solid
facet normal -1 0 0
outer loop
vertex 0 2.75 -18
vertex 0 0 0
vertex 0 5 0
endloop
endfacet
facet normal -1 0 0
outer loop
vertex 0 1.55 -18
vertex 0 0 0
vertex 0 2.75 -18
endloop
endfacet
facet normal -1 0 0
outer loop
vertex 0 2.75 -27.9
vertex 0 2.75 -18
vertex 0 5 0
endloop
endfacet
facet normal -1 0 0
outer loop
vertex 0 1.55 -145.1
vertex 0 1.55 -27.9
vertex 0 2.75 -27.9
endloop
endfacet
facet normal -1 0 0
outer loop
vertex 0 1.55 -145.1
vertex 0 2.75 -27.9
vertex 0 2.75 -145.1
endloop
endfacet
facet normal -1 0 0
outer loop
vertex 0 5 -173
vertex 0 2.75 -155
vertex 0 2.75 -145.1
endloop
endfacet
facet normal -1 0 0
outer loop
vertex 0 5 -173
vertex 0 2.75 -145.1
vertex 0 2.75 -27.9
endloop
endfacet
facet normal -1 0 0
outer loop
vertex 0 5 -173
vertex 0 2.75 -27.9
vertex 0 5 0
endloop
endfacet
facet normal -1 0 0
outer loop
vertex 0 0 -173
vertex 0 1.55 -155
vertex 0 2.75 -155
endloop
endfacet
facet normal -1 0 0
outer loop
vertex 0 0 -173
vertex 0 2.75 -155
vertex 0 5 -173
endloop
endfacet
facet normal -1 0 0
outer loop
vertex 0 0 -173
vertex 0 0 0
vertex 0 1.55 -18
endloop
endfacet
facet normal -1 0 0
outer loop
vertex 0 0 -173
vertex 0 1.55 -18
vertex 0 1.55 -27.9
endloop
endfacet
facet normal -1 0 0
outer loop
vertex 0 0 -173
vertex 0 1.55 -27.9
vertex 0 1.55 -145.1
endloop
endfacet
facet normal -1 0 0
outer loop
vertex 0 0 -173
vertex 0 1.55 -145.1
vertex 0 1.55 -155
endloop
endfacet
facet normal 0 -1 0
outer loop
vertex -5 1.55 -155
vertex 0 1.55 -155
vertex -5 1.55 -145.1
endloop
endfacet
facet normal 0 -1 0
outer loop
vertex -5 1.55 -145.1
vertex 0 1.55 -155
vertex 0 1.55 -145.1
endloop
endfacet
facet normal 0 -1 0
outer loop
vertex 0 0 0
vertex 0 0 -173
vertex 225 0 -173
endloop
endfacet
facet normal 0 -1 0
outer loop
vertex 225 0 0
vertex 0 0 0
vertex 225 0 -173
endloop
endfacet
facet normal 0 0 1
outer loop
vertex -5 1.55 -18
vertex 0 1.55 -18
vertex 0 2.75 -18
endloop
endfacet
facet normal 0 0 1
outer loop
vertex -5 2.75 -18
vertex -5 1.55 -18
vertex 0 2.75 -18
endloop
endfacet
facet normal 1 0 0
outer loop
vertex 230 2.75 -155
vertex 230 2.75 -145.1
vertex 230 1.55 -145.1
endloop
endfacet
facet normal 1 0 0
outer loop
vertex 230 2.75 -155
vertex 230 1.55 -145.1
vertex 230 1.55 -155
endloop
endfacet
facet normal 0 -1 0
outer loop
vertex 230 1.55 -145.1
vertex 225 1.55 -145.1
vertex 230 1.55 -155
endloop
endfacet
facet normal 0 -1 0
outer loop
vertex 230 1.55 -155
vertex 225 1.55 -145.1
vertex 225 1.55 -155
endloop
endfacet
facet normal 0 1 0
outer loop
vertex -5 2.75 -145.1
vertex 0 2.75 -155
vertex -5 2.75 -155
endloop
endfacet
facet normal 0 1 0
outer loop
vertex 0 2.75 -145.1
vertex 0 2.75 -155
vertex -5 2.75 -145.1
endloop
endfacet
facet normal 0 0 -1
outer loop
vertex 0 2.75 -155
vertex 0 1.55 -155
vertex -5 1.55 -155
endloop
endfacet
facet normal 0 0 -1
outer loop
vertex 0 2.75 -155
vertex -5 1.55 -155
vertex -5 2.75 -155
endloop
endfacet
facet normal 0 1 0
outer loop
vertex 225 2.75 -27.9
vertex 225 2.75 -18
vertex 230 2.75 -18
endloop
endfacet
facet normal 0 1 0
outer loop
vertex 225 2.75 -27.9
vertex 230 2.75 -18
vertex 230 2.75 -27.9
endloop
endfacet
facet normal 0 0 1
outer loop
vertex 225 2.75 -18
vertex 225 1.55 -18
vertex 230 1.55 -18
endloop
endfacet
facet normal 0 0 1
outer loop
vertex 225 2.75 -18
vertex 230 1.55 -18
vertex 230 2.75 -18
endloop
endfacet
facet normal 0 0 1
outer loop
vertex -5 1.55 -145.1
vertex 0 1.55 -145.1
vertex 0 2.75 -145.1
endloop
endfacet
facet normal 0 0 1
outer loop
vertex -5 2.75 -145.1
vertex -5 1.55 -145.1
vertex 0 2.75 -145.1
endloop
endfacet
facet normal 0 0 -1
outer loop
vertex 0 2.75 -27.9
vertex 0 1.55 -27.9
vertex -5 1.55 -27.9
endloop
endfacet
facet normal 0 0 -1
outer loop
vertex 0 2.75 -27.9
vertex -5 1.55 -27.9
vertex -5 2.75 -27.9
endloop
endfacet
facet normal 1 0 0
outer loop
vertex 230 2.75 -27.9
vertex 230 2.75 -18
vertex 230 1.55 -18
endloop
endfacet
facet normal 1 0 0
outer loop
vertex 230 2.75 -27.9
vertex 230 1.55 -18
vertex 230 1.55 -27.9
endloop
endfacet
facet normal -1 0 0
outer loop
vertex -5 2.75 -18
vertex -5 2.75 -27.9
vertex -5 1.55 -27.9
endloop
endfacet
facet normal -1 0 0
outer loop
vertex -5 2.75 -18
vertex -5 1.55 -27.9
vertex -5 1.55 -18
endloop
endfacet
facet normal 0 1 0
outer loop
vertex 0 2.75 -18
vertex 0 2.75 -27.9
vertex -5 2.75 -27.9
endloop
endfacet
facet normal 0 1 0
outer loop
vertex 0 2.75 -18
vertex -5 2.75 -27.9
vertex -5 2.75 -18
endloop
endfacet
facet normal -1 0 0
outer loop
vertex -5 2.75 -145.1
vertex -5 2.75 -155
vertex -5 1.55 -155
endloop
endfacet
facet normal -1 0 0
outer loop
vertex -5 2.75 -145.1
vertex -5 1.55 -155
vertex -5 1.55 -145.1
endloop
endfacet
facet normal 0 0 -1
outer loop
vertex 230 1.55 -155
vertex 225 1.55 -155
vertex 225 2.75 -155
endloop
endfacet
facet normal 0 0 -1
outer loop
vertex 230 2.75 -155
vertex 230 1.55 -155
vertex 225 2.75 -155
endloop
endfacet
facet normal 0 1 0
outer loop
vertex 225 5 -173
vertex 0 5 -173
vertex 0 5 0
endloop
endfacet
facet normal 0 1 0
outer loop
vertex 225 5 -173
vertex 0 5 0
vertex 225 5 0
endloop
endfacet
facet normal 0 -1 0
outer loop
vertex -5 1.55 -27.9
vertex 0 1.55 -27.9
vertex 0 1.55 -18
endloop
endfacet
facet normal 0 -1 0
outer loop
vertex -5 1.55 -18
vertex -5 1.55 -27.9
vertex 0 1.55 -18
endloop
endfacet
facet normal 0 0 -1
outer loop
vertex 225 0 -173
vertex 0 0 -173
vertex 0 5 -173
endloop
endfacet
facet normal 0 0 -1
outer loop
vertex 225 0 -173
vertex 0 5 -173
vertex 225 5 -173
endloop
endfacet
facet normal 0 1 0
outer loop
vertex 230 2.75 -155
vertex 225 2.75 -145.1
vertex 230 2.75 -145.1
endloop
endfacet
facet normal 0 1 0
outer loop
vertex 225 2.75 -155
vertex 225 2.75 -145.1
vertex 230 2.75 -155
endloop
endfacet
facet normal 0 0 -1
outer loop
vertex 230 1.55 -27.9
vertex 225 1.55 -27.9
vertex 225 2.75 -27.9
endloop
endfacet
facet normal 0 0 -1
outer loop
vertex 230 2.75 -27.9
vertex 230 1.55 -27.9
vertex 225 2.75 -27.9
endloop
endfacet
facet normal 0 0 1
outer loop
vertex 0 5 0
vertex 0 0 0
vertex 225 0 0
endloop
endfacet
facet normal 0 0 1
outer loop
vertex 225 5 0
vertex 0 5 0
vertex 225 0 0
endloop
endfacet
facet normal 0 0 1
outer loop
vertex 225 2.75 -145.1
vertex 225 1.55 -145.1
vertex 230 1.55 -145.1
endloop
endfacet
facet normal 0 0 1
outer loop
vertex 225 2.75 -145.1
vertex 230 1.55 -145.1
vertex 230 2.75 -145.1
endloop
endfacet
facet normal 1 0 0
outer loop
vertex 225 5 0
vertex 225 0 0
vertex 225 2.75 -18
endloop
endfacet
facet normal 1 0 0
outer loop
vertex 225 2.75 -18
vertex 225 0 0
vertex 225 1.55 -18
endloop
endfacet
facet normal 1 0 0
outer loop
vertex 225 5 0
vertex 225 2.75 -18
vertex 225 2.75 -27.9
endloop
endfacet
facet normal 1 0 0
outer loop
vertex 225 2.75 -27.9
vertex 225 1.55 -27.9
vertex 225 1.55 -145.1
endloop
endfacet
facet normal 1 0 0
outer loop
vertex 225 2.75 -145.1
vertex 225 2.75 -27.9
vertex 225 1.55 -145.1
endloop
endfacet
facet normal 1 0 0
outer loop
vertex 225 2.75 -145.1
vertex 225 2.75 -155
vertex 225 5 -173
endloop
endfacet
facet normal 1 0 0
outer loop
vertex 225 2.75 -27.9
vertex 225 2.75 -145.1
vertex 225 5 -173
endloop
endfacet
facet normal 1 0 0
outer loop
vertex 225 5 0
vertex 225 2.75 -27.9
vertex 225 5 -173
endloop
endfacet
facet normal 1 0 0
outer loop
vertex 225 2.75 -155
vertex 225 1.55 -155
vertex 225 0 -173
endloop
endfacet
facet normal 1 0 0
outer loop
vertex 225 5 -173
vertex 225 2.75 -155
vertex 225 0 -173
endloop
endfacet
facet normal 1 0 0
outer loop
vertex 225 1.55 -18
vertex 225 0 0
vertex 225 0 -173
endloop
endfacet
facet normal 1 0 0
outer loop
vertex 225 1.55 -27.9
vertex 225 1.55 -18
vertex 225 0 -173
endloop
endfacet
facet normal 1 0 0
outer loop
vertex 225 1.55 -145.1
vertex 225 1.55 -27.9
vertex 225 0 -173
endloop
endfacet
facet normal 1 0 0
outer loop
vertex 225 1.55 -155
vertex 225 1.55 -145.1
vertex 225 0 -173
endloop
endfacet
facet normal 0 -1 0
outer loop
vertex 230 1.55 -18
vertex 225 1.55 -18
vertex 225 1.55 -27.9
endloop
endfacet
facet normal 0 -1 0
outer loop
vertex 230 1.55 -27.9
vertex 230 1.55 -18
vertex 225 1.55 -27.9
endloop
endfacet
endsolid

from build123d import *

# Parameters (mm, degrees)
SKETCH1_W           = 225
SKETCH1_H           = 173
BOSS_EXTRUDE1_DEPTH = 5
SKETCH2_W           = 9.9
SKETCH2_H           = 1.2
BOSS_EXTRUDE2_DEPTH = 5
SKETCH3_W           = 9.9
SKETCH3_H           = 1.2
BOSS_EXTRUDE3_DEPTH = 5


with BuildPart() as part:
    # Sketch1 → Boss-Extrude1 (new body)
    with BuildSketch(Plane(origin=(0, 0, 0), x_dir=(1, 0, 0), z_dir=(0, 1, 0))):
        with Locations((112.5, 86.5)):
            Rectangle(SKETCH1_W, SKETCH1_H)
    extrude(amount=BOSS_EXTRUDE1_DEPTH)

    # Sketch2 → Boss-Extrude2 (add)
    with BuildSketch(Plane.ZY):
        with Locations((-150.05, 2.15)):
            Rectangle(SKETCH2_W, SKETCH2_H)
        with Locations((-22.95, 2.15)):
            Rectangle(SKETCH2_W, SKETCH2_H)
    extrude(amount=BOSS_EXTRUDE2_DEPTH)

    # Sketch3 → Boss-Extrude3 (add)
    with BuildSketch(Plane(origin=(225, 0, 0), x_dir=(0, 0, -1), z_dir=(1, 0, 0))):
        with Locations((22.95, 2.15)):
            Rectangle(SKETCH3_W, SKETCH3_H)
        with Locations((150.05, 2.15)):
            Rectangle(SKETCH3_W, SKETCH3_H)
    extrude(amount=BOSS_EXTRUDE3_DEPTH)


solid = part.part
